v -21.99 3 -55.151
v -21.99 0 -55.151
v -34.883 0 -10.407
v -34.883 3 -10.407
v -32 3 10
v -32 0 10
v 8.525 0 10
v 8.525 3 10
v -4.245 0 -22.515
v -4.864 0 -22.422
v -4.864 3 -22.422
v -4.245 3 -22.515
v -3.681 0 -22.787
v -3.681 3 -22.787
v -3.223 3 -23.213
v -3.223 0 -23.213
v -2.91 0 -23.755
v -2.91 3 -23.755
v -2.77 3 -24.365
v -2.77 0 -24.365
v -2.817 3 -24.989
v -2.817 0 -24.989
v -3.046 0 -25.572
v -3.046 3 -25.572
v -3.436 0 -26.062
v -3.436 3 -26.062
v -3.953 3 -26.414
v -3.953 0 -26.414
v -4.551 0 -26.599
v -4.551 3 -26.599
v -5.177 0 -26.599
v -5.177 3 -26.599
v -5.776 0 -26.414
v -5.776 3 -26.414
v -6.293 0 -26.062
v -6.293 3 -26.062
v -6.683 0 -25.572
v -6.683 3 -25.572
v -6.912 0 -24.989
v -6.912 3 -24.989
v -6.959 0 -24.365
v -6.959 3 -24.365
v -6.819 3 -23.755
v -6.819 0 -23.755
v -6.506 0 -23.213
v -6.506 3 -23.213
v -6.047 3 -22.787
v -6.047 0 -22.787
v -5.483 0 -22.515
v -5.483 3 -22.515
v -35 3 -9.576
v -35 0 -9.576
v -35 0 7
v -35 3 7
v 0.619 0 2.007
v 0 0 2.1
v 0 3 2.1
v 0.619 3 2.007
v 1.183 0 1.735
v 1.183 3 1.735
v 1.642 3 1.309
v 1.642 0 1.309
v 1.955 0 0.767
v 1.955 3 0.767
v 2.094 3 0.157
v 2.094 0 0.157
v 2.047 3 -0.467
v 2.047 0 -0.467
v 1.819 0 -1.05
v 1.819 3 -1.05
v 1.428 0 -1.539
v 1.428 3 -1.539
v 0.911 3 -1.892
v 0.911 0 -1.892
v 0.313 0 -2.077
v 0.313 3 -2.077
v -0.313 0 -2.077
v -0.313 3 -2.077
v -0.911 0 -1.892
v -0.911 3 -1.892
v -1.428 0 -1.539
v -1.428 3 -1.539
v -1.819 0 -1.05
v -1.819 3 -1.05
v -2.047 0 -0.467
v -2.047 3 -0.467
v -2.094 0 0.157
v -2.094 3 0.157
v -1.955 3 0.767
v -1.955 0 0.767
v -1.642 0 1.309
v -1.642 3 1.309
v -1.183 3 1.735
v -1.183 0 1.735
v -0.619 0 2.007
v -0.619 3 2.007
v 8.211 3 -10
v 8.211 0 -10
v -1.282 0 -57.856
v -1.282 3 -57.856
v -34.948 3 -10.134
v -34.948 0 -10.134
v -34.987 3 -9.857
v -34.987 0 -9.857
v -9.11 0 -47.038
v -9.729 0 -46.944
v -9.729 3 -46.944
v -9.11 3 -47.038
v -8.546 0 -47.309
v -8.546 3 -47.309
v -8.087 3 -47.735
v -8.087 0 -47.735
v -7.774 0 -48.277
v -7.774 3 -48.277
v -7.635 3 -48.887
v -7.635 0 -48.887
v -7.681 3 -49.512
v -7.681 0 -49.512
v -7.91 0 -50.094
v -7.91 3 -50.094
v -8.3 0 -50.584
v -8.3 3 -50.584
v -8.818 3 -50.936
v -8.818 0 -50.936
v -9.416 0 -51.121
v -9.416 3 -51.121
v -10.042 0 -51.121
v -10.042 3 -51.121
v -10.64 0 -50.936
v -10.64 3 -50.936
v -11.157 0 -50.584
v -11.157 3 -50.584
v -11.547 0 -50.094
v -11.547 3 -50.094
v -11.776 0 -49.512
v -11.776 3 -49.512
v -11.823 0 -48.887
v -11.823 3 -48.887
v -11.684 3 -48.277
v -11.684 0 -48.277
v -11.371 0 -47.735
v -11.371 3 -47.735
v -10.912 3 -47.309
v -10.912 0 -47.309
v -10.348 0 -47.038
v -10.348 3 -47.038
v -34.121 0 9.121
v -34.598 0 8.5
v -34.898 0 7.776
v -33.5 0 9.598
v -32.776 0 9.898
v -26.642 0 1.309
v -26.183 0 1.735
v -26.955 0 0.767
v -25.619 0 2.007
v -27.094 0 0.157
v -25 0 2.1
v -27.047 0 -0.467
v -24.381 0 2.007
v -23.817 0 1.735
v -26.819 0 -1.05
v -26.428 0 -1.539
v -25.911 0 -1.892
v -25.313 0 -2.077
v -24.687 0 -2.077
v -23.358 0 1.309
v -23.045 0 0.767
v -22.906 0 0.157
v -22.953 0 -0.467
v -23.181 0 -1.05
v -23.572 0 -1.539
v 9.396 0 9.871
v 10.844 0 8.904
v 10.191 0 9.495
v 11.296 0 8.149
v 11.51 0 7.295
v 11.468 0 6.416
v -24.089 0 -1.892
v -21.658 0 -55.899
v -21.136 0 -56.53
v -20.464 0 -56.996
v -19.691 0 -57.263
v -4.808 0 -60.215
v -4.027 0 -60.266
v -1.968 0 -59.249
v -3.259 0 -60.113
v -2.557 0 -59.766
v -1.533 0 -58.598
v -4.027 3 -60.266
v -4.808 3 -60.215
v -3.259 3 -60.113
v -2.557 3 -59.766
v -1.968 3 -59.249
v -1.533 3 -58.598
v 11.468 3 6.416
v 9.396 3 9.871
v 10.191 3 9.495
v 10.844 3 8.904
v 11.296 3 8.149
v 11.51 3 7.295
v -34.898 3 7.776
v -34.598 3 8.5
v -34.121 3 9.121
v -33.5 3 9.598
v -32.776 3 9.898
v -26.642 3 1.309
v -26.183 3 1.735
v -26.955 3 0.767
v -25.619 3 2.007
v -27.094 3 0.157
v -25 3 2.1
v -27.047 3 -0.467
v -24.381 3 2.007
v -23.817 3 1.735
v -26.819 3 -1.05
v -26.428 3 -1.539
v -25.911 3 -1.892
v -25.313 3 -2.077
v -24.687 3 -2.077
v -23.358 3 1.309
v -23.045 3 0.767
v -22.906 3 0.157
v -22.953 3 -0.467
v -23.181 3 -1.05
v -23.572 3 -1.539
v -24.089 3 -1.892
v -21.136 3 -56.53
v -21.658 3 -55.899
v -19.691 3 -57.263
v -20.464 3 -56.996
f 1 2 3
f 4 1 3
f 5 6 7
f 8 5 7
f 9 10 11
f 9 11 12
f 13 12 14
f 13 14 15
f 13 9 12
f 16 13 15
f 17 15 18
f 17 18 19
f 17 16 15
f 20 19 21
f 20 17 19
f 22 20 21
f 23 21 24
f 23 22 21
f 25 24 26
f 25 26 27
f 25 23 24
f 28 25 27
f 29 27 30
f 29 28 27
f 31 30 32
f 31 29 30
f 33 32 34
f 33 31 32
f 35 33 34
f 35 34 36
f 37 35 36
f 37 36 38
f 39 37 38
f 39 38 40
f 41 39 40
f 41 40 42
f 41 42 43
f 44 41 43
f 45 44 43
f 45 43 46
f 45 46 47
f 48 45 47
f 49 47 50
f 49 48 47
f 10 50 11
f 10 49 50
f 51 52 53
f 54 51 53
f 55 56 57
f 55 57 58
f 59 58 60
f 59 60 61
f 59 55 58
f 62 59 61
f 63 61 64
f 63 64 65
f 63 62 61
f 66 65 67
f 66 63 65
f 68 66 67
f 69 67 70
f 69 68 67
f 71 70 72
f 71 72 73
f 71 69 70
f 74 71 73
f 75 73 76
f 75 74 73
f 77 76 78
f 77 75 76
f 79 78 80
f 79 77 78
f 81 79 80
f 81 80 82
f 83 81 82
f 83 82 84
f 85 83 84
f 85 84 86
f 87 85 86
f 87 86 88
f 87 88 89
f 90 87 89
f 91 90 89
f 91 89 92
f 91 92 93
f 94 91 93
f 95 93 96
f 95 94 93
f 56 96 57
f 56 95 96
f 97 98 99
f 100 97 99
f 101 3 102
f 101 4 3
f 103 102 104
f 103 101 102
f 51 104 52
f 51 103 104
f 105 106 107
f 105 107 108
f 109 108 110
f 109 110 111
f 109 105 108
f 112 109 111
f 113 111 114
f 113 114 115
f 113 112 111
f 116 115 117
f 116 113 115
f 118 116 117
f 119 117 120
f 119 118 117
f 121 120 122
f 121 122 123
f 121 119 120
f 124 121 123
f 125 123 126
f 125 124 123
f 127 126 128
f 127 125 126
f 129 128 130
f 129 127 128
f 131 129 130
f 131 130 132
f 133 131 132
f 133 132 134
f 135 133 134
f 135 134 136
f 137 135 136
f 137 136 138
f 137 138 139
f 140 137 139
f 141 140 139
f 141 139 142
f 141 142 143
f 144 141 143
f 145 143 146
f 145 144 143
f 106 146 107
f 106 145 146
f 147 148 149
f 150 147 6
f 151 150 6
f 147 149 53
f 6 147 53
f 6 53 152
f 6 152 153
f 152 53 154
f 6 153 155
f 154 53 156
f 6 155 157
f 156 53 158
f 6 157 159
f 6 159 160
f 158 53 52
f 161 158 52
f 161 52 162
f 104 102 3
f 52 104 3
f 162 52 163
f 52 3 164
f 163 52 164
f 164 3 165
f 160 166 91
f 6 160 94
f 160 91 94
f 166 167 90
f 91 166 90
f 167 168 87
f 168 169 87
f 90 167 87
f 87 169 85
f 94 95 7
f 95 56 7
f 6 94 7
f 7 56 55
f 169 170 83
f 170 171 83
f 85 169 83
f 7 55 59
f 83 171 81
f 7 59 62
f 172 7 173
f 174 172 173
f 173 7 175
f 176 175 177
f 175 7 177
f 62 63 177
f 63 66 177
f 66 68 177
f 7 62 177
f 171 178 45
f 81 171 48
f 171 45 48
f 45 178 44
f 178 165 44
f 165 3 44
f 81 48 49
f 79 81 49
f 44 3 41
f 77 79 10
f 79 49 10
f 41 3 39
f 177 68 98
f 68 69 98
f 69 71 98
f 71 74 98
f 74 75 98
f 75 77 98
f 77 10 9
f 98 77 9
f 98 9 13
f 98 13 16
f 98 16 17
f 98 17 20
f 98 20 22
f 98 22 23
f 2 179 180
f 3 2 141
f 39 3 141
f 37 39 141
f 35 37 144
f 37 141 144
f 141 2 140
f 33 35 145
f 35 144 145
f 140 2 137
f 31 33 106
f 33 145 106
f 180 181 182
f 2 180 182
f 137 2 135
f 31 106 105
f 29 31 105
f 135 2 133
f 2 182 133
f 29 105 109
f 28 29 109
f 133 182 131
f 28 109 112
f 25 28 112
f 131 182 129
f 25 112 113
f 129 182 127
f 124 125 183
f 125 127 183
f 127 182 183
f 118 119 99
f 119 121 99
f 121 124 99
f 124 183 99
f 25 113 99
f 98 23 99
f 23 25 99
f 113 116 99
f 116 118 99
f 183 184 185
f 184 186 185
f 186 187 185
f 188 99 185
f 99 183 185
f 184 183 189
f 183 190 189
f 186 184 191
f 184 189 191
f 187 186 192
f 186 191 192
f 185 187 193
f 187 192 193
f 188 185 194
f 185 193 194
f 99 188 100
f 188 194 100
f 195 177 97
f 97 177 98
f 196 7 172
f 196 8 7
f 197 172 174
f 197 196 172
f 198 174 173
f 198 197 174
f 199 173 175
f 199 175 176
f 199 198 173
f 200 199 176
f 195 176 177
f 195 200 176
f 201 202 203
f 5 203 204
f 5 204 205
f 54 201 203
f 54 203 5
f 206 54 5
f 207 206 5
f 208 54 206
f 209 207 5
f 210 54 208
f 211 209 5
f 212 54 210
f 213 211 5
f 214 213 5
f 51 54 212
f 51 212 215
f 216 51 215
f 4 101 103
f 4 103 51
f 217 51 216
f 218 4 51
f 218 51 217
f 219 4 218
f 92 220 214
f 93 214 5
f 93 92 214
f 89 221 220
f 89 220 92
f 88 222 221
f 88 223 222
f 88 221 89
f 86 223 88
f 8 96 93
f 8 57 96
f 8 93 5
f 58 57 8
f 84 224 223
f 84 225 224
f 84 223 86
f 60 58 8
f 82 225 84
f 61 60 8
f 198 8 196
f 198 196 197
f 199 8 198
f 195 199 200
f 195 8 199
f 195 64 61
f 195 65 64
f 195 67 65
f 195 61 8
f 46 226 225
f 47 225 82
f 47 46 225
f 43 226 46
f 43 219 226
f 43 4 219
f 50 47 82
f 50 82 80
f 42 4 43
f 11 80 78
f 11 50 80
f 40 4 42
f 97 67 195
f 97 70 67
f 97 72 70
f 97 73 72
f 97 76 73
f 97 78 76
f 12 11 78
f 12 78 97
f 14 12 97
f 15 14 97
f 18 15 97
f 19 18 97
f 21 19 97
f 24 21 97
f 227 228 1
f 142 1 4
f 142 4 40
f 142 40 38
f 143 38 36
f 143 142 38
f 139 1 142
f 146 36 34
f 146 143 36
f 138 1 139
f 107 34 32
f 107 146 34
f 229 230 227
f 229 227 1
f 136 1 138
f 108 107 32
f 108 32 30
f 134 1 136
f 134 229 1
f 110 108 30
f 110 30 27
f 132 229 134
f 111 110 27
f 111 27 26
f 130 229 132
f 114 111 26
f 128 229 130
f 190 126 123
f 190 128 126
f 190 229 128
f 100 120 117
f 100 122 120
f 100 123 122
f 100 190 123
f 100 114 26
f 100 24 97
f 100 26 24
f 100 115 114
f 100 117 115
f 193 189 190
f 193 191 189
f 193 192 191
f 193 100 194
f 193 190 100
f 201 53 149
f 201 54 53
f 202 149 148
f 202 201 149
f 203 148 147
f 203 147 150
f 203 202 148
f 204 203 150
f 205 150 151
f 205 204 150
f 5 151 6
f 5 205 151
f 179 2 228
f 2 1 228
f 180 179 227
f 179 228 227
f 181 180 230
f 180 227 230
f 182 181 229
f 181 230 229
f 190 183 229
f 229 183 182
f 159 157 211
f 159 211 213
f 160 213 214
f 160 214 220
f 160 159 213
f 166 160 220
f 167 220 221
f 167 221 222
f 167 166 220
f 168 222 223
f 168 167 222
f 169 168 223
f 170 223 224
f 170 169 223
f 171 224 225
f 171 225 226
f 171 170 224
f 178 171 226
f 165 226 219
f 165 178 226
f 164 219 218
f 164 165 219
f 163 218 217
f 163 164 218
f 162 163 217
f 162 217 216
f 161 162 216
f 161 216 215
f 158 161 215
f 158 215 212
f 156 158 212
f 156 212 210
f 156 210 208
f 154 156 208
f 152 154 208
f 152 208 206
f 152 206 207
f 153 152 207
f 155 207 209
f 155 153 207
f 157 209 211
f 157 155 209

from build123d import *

# Parameters (mm, degrees)
SKETCH_1_R      = 2.1
EXTRUDE_1_DEPTH = 3
FILLET_1_R      = 3


with BuildPart() as part:
    # 草图1 → 凸台-拉伸1 (new body)
    # profile 1 of 3: a face of its own
    with BuildSketch(Plane(origin=(0, 0, 0), x_dir=(1, 0, 0), z_dir=(0, 1, 0))):
        Polygon((-12.178532268, 10), (8.211170098, 10), (-1.865732489, 60.799005274), (-21.48347839, 56.907470127), align=None)
        with Locations(Location((-4.864418933, 24.522182375, 0), (0, 0, 270))):
            Circle(SKETCH_1_R, mode=Mode.SUBTRACT)
        with Locations(Location((-9.728837866, 49.04436475, 0), (0, 0, 270))):
            Circle(SKETCH_1_R, mode=Mode.SUBTRACT)
    # profile 2 of 3: a face of its own
    with BuildSketch(Plane(origin=(0, 0, 0), x_dir=(1, 0, 0), z_dir=(0, 1, 0))):
        Polygon((12.178532268, -10), (8.211170098, 10), (-12.178532268, 10), (-35, 10), (-35, -10), align=None)
        with Locations(Location((-25, 0, 0), (0, 0, 270))):
            Circle(SKETCH_1_R, mode=Mode.SUBTRACT)
        with Locations(Location((0, 0, 0), (0, 0, 270))):
            Circle(SKETCH_1_R, mode=Mode.SUBTRACT)
    # profile 3 of 3: a face of its own
    with BuildSketch(Plane(origin=(0, 0, 0), x_dir=(1, 0, 0), z_dir=(0, 1, 0))):
        Polygon((-35, 10), (-12.178532268, 10), (-21.48347839, 56.907470127), align=None)
    extrude(amount=EXTRUDE_1_DEPTH)

    # 圆角1
    fillet_1_edges = [part.edges().sort_by_distance(p)[0] for p in [
        (12.178532268, 1.5, 10),
        (-35, 1.5, 10),
        (-35, 1.5, -10),
        (-21.48347839, 1.5, -56.907470127),
        (-1.865732489, 1.5, -60.799005274),
    ]]
    fillet(fillet_1_edges, radius=FILLET_1_R)


solid = part.part
